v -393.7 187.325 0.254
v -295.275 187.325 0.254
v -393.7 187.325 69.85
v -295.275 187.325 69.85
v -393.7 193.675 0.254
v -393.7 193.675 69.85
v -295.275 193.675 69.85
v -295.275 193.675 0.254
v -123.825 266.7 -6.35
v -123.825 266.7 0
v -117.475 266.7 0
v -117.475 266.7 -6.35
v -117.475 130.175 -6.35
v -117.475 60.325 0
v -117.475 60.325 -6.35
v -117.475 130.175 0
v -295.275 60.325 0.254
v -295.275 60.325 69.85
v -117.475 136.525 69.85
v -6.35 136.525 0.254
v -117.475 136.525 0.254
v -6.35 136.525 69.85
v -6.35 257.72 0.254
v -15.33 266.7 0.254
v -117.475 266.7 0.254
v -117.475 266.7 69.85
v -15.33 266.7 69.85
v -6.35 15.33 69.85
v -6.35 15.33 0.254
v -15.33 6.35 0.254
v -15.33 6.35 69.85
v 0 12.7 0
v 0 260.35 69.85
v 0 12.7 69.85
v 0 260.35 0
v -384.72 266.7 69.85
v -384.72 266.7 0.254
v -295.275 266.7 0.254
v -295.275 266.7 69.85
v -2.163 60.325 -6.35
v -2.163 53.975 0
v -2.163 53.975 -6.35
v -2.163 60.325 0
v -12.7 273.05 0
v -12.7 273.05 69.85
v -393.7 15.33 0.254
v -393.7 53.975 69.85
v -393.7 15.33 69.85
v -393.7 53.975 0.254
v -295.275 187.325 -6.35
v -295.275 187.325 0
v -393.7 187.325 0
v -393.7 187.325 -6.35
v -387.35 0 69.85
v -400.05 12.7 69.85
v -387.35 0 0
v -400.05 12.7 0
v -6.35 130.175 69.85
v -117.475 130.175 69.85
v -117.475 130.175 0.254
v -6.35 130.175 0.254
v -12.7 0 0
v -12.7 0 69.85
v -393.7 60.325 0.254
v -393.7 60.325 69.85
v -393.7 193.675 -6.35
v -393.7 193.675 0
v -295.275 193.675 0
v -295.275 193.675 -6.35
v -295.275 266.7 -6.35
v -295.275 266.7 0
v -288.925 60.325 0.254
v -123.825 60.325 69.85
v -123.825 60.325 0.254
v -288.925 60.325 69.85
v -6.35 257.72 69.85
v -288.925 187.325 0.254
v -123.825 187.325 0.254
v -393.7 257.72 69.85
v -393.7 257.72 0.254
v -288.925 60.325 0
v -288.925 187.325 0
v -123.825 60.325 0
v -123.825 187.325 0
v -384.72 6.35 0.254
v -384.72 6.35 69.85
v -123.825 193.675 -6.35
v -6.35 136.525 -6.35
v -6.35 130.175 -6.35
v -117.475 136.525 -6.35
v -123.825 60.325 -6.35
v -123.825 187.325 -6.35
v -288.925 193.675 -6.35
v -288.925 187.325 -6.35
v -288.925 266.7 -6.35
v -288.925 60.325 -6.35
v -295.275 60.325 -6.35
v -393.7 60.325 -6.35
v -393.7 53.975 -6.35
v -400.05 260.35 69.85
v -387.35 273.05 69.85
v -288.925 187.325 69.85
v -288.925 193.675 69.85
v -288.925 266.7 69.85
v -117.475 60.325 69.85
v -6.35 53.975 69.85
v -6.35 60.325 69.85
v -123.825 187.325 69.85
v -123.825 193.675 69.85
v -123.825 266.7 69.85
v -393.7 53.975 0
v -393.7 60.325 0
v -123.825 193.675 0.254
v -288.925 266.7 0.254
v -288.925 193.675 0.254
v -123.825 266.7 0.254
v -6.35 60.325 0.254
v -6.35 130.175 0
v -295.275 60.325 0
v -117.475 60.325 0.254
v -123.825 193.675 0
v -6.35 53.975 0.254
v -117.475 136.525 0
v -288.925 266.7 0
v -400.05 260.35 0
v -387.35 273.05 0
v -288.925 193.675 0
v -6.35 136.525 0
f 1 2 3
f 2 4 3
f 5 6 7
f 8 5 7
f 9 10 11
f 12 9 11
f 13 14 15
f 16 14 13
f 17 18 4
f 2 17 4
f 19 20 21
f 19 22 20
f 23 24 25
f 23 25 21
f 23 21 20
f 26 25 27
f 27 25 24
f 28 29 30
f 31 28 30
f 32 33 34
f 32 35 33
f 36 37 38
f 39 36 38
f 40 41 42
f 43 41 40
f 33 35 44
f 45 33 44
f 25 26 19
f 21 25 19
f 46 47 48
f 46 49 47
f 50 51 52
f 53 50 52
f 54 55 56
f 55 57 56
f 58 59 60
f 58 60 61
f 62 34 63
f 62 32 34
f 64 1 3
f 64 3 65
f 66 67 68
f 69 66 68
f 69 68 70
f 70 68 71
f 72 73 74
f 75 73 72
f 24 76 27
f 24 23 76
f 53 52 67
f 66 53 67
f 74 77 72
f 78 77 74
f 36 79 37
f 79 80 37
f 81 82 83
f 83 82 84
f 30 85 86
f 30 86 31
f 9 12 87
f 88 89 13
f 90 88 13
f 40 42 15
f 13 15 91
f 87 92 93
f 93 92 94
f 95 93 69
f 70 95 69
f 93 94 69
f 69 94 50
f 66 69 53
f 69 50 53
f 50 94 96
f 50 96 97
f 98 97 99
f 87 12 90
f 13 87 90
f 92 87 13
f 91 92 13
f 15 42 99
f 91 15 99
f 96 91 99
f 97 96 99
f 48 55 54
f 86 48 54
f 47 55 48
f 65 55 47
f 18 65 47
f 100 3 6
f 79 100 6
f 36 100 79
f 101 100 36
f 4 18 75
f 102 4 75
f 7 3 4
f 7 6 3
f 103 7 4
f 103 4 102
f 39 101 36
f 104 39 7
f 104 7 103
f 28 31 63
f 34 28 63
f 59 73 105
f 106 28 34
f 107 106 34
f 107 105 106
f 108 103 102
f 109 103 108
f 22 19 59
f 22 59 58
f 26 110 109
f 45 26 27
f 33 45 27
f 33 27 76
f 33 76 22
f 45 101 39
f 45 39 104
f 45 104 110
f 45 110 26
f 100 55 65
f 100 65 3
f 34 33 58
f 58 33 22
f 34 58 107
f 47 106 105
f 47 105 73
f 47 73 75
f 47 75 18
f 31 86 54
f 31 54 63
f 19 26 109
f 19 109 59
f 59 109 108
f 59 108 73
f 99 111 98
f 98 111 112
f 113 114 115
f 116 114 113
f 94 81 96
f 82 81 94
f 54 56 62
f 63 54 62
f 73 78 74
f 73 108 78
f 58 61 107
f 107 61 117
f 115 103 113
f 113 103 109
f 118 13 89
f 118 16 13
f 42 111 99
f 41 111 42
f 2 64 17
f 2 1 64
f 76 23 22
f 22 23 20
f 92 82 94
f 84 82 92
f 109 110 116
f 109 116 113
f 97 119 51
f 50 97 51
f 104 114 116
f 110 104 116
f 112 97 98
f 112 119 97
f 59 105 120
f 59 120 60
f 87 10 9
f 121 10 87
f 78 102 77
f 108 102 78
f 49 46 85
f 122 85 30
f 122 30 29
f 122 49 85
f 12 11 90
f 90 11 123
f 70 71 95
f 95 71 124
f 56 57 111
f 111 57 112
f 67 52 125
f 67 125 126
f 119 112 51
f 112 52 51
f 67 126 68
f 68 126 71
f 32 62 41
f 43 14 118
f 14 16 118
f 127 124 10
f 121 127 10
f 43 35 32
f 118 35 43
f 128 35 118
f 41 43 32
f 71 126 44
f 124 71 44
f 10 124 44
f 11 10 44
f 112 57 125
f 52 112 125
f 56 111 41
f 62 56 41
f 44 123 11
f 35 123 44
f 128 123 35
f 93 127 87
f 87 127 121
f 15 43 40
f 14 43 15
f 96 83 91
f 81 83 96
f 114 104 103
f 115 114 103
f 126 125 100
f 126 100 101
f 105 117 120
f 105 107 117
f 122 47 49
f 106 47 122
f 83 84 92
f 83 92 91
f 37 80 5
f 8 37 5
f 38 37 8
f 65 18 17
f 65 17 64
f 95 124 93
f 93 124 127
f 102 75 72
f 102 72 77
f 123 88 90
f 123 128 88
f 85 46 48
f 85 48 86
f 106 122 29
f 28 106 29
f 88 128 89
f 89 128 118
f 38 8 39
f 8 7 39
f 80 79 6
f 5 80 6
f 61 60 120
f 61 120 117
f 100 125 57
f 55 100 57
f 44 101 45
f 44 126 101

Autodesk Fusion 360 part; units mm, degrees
sketch "Sketch1" plane through (0, 0, 0) normal (0, 0, 1) x (1, 0, 0)
  line L0 (-400.05, 260.35) -> (-387.35, 273.05)
  line L1 (-400.05, 12.7) -> (-387.35, 0)
  line L2 (-400.05, 260.35) -> (-400.05, 12.7)
  line L3 (0, 260.35) -> (-12.7, 273.05)
  line L4 (0, 12.7) -> (-12.7, 0)
  line L5 (0, 260.35) -> (0, 12.7)
  line L6 (-387.35, 0) -> (-12.7, 0)
  line L7 (-387.35, 273.05) -> (-12.7, 273.05)
  line L8 (-6.35, 257.7197) -> (-15.3303, 266.7)
  line L9 (-384.7197, 266.7) -> (-15.3303, 266.7)
  line L10 (-393.7, 257.7197) -> (-384.7197, 266.7)
  line L11 (-393.7, 257.7197) -> (-393.7, 15.3303)
  line L12 (-393.7, 15.3303) -> (-384.7197, 6.35)
  line L13 (-384.7197, 6.35) -> (-15.3303, 6.35)
  line L14 (-6.35, 15.3303) -> (-15.3303, 6.35)
  line L15 (-6.35, 257.7197) -> (-6.35, 15.3303)
  dimension "d5" = 6.35
extrude "Extrude1" add sketch "Sketch1" along normal blind 0.254 contours L0 L1 L2 L3 L4 L5 L6 L7 | L8 L9 L10 L11 L12 L13 L14 L15
extrude "Extrude2" add sketch "Sketch1" along normal blind 69.85
sketch "Sketch2" plane through (0, 0, 69.85) normal (0, 0, 1) x (-1, 0, 0)
  line L0 (393.7, -15.3303) -> (393.7, -257.7197)
  line L1 (393.7, -257.7197) -> (384.7197, -266.7)
  line L2 (384.7197, -266.7) -> (15.3303, -266.7)
  line L3 (15.3303, -266.7) -> (6.35, -257.7197)
  line L4 (6.35, -257.7197) -> (6.35, -15.3303)
  line L5 (6.35, -15.3303) -> (15.3303, -6.35)
  line L6 (15.3303, -6.35) -> (384.7197, -6.35)
  line L7 (384.7197, -6.35) -> (393.7, -15.3303)
  line L8 (400.05, -260.35) -> (400.05, -12.7)
  line L9 (400.05, -12.7) -> (387.35, 0)
  line L10 (387.35, 0) -> (12.7, 0)
  line L11 (12.7, 0) -> (0, -12.7)
  line L12 (0, -12.7) -> (0, -260.35)
  line L13 (0, -260.35) -> (12.7, -273.05)
  line L14 (12.7, -273.05) -> (387.35, -273.05)
  line L15 (387.35, -273.05) -> (400.05, -260.35)
  line L16 (393.7, -162.4342) -> (393.7, -166.61)
  line L17 (295.275, -266.7) -> (288.925, -266.7)
  line L18 (393.7, -193.675) -> (295.275, -193.675)
  line L19 (393.7, -193.675) -> (295.275, -193.675)
  line L20 (295.275, -193.675) -> (295.275, -187.325)
  line L21 (295.275, -187.325) -> (393.7, -187.325)
  line L22 (393.7, -187.325) -> (393.7, -193.675)
  line L23 (295.275, -187.325) -> (295.275, -193.675)
  line L24 (2.1633, -60.325) -> (288.925, -60.325)
  line L25 (288.925, -60.325) -> (288.925, -187.325)
  line L26 (2.1633, -60.325) -> (393.7, -60.325)
  line L27 (393.7, -60.325) -> (393.7, -53.975)
  line L28 (393.7, -53.975) -> (2.1633, -53.975)
  line L29 (2.1633, -53.975) -> (2.1633, -60.325)
  line L30 (295.275, -53.975) -> (288.925, -53.975)
  line L31 (288.925, -187.325) -> (123.825, -187.325)
  line L32 (123.825, -187.325) -> (117.475, -187.325)
  line L33 (117.475, -187.325) -> (123.825, -187.325)
  line L34 (123.825, -187.325) -> (123.825, -60.325)
  line L35 (123.825, -60.325) -> (117.475, -60.325)
  line L36 (117.475, -60.325) -> (117.475, -187.325)
  line L37 (295.275, -187.325) -> (288.925, -187.325)
  line L38 (288.925, -187.325) -> (288.925, -60.325)
  line L39 (288.925, -60.325) -> (295.275, -60.325)
  line L40 (295.275, -60.325) -> (295.275, -187.325)
  line L41 (295.275, -266.7) -> (288.925, -266.7)
  line L42 (288.925, -266.7) -> (288.925, -193.675)
  line L43 (288.925, -193.675) -> (295.275, -193.675)
  line L44 (295.275, -193.675) -> (295.275, -266.7)
  line L45 (117.475, -60.325) -> (123.825, -60.325)
  line L46 (123.825, -60.325) -> (123.825, -130.175)
  line L47 (123.825, -130.175) -> (117.475, -130.175)
  line L48 (117.475, -130.175) -> (117.475, -60.325)
  line L49 (117.475, -130.175) -> (6.35, -130.175)
  line L50 (6.35, -130.175) -> (6.35, -136.525)
  line L51 (6.35, -136.525) -> (117.475, -136.525)
  line L52 (117.475, -136.525) -> (117.475, -130.175)
  line L53 (117.475, -187.325) -> (393.7, -187.325)
  line L54 (393.7, -187.325) -> (393.7, -193.675)
  line L55 (393.7, -193.675) -> (117.475, -193.675)
  line L56 (117.475, -193.675) -> (117.475, -187.325)
  line L57 (123.825, -193.675) -> (117.475, -193.675)
  line L58 (117.475, -193.675) -> (117.475, -266.7)
  line L59 (117.475, -266.7) -> (123.825, -266.7)
  line L60 (123.825, -266.7) -> (123.825, -193.675)
  dimension "d11" = 6.35
  dimension "d12" = 73.025
  dimension "d13" = 6.35
  dimension "d15" = 6.35
  dimension "d17" = 6.35
  dimension "d18" = 165.1
  dimension "d19" = 6.35
  dimension "d22" = 127
  dimension "d23" = 6.35
  dimension "d24" = 69.85
  dimension "d25" = 6.35
extrude "Extrude3" add sketch "Sketch2" against normal blind 76.2 contours L0 L4 L24 L26 L27 L28 L30 L35 L39 L45 | L25 L26 L37 L38 L39 L40 L53 | L0 L18 L19 L20 L21 L22 L23 L53 L54 L55 | L20 L23 L31 L32 L33 L37 L43 L53 L55 L56 L57 | L4 L24 L26 L28 L29 | L24 L26 L34 L35 L36 L45 L46 L47 L48 | L2 L17 L41 L42 L43 L44 L55 | L32 L33 L34 L36 L47 L52 L53 | L4 L36 L49 L50 L51 L52 | L2 L55 L57 L58 L59 L60
